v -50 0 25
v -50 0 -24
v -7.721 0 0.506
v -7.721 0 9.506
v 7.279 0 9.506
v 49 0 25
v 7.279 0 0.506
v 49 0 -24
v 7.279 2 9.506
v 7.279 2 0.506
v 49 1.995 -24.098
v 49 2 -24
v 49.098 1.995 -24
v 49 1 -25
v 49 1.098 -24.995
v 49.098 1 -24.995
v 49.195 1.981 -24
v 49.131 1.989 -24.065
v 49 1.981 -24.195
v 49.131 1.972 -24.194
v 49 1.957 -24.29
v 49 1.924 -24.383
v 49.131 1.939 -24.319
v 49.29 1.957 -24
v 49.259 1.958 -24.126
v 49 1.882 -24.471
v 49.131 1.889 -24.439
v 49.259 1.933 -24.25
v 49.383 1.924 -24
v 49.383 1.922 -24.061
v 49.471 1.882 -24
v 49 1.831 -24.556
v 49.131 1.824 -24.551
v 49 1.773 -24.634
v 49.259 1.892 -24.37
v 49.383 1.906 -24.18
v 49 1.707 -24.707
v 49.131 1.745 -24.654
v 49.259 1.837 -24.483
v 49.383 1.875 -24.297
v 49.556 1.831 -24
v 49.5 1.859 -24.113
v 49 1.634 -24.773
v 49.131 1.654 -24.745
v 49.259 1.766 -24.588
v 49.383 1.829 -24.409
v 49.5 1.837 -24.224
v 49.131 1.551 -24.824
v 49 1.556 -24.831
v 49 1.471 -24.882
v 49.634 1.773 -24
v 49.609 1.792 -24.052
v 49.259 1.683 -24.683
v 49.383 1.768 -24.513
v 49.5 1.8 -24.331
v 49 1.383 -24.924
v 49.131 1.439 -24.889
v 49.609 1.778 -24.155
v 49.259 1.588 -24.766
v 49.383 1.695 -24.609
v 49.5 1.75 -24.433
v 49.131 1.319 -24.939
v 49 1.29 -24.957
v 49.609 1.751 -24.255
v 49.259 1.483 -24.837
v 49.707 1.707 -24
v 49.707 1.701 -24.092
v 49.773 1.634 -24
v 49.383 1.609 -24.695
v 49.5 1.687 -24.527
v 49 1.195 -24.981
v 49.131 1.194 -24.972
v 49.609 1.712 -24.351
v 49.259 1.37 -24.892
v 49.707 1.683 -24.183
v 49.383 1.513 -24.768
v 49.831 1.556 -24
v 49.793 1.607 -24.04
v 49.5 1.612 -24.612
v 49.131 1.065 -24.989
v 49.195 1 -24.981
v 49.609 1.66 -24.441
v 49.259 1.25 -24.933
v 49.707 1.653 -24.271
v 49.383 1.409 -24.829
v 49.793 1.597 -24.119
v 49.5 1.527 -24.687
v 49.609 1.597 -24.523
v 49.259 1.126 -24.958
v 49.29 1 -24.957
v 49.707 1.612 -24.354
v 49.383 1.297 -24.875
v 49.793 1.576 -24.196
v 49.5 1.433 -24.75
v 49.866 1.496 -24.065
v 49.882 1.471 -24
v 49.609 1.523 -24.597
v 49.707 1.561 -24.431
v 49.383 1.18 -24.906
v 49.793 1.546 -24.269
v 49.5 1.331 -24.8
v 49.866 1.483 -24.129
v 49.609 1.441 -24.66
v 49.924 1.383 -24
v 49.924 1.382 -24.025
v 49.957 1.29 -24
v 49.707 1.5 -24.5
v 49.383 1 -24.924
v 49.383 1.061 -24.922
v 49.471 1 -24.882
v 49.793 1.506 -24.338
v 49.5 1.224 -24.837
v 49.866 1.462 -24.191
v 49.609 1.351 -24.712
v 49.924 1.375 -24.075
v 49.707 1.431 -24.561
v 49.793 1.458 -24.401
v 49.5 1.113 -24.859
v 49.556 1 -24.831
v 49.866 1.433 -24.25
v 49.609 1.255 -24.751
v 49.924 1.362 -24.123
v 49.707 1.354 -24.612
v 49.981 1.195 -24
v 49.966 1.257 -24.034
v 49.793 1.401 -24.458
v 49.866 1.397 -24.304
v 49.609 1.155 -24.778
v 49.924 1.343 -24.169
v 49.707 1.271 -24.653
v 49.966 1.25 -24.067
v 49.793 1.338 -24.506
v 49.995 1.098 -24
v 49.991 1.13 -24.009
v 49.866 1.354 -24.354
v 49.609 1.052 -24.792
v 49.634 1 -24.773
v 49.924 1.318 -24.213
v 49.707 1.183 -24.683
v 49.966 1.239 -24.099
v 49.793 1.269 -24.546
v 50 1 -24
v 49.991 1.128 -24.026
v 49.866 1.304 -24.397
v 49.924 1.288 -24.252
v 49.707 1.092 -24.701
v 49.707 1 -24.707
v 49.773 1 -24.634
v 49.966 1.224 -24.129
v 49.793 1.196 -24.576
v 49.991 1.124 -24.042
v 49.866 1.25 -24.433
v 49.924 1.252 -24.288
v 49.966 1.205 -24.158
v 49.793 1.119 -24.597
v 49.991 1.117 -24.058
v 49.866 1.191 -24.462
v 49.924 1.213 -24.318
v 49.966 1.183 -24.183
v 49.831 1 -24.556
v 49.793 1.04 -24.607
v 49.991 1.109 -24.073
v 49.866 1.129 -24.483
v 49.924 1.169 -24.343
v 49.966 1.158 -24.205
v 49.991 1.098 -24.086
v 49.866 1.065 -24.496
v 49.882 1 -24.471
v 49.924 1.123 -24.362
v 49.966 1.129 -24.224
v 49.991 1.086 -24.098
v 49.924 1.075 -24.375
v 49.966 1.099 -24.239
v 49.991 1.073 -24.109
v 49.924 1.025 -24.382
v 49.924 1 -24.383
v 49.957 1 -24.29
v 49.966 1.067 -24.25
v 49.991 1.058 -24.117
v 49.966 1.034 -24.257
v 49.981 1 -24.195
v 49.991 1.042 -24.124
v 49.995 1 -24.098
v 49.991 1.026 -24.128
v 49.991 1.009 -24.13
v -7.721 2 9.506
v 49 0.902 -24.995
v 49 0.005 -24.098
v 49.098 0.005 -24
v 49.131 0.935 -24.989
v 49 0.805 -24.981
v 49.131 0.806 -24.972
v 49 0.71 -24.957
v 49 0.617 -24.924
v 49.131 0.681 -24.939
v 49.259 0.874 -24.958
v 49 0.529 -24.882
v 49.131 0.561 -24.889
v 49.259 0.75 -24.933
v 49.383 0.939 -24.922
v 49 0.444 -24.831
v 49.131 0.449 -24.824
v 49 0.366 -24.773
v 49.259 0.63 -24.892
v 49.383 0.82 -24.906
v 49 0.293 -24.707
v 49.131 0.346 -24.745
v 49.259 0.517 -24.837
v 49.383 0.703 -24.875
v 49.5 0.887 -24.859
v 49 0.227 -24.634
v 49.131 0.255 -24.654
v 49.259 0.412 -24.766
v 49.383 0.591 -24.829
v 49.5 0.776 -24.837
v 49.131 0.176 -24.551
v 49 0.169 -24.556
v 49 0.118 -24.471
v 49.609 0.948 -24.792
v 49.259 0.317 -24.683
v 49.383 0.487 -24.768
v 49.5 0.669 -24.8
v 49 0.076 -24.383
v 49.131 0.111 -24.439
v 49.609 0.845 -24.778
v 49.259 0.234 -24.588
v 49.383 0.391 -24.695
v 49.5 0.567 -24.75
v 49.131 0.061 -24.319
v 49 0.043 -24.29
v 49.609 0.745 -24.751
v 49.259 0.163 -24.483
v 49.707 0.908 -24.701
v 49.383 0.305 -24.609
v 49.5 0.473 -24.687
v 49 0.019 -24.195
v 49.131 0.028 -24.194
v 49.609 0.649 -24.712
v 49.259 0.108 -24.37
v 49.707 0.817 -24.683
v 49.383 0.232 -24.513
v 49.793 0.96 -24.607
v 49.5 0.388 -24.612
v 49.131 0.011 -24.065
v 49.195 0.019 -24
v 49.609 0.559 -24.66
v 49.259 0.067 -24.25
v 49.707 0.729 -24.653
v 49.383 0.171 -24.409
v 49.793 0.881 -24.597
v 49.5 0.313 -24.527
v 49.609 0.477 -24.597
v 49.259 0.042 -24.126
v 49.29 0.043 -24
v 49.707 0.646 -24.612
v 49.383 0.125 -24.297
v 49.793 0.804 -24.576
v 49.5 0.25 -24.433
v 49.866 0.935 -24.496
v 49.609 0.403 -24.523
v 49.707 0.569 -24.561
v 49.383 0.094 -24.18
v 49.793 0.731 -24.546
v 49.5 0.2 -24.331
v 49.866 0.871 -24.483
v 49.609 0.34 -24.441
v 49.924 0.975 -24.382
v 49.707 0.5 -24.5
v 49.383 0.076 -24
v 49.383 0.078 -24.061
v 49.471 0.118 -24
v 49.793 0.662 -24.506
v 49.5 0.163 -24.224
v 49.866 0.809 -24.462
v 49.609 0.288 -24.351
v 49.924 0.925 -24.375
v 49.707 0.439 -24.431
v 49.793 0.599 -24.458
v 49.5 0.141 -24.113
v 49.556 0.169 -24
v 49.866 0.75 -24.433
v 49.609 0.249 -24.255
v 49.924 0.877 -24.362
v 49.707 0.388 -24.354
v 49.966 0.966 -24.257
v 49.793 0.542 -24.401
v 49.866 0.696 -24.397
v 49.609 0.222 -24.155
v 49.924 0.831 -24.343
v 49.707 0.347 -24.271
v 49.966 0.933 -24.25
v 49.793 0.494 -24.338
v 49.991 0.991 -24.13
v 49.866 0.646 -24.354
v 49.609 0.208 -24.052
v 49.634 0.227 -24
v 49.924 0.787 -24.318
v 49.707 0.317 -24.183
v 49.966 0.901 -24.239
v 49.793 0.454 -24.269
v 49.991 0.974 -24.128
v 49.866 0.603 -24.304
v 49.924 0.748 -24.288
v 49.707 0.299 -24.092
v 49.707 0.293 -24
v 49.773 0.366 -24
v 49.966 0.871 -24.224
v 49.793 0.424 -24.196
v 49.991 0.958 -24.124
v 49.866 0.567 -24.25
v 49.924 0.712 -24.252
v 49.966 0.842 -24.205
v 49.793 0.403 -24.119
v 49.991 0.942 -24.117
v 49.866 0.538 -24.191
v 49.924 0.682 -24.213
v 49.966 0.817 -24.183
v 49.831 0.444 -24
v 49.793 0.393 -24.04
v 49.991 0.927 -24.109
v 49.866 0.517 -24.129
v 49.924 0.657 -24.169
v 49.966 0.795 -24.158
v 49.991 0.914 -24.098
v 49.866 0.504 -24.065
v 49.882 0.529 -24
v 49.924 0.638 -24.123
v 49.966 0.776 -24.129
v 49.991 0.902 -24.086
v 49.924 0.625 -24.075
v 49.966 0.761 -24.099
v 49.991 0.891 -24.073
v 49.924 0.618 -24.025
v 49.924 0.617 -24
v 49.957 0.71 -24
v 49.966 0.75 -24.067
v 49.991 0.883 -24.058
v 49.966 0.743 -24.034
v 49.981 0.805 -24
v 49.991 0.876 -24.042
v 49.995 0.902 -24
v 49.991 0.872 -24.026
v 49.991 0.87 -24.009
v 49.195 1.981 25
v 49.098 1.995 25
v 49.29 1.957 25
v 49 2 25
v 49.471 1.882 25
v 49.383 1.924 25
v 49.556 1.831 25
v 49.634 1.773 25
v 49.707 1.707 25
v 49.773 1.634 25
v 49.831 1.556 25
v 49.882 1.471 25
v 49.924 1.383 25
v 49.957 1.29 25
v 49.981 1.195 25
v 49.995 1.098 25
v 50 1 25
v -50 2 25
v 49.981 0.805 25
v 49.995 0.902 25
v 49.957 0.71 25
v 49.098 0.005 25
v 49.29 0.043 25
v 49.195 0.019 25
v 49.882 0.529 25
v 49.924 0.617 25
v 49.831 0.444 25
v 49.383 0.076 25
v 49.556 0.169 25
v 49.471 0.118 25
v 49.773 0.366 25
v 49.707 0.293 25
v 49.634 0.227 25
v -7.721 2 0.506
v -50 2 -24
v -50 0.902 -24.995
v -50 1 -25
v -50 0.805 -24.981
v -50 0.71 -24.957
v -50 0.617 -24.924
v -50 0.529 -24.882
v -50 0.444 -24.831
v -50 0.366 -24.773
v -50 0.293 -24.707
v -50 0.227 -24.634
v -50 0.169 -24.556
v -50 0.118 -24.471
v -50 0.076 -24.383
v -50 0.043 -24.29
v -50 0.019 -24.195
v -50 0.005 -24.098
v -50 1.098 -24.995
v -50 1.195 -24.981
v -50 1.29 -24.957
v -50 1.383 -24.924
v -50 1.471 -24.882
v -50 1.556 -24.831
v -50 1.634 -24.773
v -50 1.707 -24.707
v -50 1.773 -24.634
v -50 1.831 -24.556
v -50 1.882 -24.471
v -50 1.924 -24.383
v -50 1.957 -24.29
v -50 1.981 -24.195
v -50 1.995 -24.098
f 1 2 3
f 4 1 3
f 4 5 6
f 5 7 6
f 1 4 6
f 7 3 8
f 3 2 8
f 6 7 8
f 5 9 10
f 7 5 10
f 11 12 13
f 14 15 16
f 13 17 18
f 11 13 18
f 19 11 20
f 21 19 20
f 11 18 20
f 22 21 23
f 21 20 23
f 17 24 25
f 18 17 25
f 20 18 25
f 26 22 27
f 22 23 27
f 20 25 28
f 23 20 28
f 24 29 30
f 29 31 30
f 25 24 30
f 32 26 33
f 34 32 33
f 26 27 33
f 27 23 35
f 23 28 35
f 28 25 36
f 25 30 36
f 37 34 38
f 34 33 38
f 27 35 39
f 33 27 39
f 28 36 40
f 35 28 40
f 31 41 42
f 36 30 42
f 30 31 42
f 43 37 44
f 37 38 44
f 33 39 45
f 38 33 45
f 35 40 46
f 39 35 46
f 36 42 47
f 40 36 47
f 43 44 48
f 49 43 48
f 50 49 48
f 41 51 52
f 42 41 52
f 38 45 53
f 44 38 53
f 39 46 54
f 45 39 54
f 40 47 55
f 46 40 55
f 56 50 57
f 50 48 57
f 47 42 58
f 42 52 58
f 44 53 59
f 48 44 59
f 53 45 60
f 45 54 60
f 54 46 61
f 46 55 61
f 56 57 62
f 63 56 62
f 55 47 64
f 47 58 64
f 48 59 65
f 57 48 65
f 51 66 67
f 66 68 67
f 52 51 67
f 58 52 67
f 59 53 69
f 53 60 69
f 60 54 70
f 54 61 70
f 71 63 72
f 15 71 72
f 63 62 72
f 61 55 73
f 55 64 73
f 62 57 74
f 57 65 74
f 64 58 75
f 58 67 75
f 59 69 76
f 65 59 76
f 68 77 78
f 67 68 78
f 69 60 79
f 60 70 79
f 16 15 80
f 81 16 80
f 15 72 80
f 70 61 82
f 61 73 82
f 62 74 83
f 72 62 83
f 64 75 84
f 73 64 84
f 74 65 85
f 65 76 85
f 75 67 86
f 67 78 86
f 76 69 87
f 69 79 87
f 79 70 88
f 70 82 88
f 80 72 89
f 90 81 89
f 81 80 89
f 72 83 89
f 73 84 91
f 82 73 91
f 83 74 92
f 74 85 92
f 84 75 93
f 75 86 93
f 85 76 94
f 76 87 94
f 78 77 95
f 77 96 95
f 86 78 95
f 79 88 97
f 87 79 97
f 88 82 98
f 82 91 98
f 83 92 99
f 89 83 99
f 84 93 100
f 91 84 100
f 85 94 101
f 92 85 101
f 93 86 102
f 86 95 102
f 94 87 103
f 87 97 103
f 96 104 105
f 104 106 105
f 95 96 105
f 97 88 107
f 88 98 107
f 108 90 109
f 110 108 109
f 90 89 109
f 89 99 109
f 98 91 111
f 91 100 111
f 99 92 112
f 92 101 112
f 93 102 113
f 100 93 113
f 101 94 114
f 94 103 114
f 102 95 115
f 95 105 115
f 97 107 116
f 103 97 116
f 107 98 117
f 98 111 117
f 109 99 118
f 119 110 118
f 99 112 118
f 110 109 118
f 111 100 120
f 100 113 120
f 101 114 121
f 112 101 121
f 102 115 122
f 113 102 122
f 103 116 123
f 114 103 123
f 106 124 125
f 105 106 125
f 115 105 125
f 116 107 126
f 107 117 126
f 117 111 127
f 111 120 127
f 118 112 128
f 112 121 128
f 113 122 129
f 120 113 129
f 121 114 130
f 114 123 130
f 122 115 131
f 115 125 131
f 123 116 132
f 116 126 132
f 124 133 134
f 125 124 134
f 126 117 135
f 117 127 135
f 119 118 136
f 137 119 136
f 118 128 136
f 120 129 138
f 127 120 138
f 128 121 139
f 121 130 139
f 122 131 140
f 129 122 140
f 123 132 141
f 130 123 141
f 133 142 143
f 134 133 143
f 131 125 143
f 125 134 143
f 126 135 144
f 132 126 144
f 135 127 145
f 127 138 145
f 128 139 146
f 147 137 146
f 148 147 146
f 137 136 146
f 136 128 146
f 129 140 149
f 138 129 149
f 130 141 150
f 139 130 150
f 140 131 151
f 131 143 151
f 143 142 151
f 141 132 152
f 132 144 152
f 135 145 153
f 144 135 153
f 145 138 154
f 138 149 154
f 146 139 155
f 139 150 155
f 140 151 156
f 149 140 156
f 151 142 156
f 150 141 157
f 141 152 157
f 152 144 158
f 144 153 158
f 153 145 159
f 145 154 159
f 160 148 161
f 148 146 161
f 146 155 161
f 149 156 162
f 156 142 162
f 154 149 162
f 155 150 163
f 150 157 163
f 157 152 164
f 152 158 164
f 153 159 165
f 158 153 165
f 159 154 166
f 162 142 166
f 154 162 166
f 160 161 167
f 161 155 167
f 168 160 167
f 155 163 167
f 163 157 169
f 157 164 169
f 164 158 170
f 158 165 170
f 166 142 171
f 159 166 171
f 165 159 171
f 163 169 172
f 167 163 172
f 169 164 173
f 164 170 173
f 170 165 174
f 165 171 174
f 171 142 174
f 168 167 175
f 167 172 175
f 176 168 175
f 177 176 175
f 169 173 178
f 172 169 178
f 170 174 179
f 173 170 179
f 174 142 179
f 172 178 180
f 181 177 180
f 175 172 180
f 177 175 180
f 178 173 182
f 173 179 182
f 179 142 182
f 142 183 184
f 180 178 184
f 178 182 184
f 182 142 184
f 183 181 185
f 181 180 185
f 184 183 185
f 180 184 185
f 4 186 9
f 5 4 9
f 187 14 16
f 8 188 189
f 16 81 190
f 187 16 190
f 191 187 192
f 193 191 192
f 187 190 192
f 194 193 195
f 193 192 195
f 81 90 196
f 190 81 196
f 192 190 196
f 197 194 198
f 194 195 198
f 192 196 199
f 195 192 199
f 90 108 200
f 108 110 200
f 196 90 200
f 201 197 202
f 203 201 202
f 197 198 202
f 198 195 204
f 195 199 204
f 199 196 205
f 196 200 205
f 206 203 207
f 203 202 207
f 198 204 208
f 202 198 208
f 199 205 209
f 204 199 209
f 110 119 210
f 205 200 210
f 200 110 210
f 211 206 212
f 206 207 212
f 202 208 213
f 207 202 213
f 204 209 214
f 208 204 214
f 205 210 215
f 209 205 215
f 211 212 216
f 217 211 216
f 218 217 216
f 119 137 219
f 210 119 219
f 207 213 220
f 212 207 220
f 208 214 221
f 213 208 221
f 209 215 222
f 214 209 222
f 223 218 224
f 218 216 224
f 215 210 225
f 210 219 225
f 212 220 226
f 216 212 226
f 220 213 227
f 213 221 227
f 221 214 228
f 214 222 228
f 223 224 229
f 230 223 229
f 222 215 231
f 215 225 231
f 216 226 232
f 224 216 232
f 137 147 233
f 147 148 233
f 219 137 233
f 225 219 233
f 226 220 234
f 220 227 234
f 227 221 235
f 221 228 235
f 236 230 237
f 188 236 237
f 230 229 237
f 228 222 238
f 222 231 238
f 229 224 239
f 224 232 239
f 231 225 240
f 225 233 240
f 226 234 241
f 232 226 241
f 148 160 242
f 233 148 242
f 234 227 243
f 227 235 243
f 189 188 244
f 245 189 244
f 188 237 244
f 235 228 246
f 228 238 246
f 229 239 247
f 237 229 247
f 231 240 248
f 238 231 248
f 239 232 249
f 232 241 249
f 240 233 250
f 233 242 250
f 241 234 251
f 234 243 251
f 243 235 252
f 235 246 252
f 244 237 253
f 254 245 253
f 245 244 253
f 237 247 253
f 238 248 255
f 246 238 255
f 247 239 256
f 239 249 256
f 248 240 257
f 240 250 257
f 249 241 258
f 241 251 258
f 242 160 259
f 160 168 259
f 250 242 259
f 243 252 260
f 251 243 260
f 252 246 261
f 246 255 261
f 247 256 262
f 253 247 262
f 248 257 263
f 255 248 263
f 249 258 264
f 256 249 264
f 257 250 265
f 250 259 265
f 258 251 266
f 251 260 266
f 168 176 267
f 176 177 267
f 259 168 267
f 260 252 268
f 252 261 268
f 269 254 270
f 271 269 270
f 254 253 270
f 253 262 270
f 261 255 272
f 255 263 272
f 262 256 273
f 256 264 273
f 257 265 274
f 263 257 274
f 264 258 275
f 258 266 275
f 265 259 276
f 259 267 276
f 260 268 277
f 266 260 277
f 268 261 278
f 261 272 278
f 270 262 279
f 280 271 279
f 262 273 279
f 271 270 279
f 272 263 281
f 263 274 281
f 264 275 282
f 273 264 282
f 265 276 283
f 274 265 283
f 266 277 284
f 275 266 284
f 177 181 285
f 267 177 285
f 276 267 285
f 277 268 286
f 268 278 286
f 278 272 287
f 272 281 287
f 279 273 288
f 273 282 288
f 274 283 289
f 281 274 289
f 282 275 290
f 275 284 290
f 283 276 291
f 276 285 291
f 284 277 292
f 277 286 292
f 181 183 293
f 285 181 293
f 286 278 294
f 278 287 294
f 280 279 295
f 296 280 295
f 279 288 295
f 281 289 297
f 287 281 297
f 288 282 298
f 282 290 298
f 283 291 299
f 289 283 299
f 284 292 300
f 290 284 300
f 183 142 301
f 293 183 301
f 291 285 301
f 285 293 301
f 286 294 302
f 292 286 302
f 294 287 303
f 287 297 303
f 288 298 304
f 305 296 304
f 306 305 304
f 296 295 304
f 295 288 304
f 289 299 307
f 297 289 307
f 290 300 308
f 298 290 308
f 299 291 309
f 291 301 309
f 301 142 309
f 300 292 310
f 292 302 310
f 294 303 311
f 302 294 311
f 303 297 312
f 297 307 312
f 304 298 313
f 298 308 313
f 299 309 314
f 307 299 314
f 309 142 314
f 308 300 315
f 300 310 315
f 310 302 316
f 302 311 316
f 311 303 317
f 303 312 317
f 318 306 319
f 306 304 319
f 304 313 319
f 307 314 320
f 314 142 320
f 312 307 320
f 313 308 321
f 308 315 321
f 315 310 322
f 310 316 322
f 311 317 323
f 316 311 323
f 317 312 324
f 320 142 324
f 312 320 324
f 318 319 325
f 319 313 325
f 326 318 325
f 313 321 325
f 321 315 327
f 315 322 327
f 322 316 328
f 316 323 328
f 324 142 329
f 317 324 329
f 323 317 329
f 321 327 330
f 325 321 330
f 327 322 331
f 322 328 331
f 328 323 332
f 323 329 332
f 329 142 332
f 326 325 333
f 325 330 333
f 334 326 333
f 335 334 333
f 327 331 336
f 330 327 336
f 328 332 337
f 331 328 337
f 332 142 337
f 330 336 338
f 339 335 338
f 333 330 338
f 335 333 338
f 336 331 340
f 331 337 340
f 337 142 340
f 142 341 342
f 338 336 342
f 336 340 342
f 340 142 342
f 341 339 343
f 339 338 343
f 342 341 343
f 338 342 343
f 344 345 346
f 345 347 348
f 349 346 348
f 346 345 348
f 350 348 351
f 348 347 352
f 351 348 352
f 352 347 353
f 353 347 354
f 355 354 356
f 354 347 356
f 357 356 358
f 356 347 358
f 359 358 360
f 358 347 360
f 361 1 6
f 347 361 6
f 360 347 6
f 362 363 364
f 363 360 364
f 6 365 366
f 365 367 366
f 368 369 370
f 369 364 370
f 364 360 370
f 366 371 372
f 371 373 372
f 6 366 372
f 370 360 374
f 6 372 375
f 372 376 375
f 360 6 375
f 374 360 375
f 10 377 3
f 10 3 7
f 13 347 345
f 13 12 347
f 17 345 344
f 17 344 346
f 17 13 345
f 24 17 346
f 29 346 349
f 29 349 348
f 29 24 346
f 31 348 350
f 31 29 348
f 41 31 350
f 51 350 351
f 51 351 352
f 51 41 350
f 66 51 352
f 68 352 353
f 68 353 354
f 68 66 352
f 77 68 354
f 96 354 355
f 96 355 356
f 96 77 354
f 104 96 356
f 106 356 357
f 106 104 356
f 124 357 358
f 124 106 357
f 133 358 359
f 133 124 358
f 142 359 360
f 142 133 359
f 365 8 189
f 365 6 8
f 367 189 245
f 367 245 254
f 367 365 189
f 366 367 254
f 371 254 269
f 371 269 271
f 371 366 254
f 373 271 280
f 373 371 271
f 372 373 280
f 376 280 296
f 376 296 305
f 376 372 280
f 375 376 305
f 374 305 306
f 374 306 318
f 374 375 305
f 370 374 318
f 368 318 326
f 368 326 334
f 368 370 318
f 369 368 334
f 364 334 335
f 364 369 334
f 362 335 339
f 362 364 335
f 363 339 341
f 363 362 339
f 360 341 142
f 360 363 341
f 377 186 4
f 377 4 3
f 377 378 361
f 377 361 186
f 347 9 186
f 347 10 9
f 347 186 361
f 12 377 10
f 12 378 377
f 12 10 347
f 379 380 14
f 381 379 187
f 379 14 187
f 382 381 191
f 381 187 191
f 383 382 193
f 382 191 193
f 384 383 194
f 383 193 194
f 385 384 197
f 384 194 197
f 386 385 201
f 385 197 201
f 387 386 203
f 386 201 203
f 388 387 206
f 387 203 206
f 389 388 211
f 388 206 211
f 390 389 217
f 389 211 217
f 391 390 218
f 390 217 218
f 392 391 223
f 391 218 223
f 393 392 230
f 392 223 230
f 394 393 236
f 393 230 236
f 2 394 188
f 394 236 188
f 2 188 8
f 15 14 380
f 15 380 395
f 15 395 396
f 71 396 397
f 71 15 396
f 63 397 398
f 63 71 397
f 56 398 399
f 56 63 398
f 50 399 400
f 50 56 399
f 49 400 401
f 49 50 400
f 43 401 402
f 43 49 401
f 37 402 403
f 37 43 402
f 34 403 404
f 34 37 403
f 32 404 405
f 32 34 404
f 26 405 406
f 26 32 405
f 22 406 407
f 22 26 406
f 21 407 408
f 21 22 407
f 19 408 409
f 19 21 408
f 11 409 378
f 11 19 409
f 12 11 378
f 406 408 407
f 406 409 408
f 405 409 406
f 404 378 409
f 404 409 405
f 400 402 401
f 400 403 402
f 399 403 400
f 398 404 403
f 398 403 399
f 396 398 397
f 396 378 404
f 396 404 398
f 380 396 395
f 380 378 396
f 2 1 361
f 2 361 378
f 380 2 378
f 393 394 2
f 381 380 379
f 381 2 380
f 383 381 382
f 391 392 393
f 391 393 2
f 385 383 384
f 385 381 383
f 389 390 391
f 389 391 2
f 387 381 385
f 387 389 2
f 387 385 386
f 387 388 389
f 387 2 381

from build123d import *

# Parameters (mm, degrees)
SCHIZZO1_W                   = 100
SCHIZZO1_H                   = 50
ESTRUSIONE_ESTRUSIONE1_DEPTH = 2
RACCORDO1_R                  = 1
RACCORDO2_R                  = 1
SCHIZZO2_W                   = 15
SCHIZZO2_H                   = 9
TAGLIO_ESTRUSIONE1_DEPTH     = 10


with BuildPart() as part:
    # Schizzo1 → Estrusione-Estrusione1 (new body)
    with BuildSketch(Plane(origin=(0, 0, 0), x_dir=(1, 0, 0), z_dir=(0, 1, 0))):
        Rectangle(SCHIZZO1_W, SCHIZZO1_H)
    extrude(amount=ESTRUSIONE_ESTRUSIONE1_DEPTH)

    # Raccordo1
    raccordo1_edges = [part.edges().sort_by_distance(p)[0] for p in [
        (0, 0, -25),
        (0, 2, -25),
    ]]
    fillet(raccordo1_edges, radius=RACCORDO1_R - 0.0001)  # a hair under: the kernel refuses the full size

    # Raccordo2
    raccordo2_edges = [part.edges().sort_by_distance(p)[0] for p in [
        (50, 0.292863929, -24.707136071),
        (50, 1.707136071, -24.707136071),
        (50, 0, 0.49995),
        (50, 2, 0.49995),
    ]]
    fillet(raccordo2_edges, radius=RACCORDO2_R - 0.0001)  # a hair under: the kernel refuses the full size

    # Schizzo2 → Taglio-Estrusione1 (cut)
    with BuildSketch(Plane(origin=(0, 2, 0), x_dir=(1, 0, 0), z_dir=(0, 1, 0))):
        with Locations((-0.220921897, -5.005960214)):
            Rectangle(SCHIZZO2_W, SCHIZZO2_H)
    extrude(amount=-TAGLIO_ESTRUSIONE1_DEPTH, mode=Mode.SUBTRACT)


solid = part.part
